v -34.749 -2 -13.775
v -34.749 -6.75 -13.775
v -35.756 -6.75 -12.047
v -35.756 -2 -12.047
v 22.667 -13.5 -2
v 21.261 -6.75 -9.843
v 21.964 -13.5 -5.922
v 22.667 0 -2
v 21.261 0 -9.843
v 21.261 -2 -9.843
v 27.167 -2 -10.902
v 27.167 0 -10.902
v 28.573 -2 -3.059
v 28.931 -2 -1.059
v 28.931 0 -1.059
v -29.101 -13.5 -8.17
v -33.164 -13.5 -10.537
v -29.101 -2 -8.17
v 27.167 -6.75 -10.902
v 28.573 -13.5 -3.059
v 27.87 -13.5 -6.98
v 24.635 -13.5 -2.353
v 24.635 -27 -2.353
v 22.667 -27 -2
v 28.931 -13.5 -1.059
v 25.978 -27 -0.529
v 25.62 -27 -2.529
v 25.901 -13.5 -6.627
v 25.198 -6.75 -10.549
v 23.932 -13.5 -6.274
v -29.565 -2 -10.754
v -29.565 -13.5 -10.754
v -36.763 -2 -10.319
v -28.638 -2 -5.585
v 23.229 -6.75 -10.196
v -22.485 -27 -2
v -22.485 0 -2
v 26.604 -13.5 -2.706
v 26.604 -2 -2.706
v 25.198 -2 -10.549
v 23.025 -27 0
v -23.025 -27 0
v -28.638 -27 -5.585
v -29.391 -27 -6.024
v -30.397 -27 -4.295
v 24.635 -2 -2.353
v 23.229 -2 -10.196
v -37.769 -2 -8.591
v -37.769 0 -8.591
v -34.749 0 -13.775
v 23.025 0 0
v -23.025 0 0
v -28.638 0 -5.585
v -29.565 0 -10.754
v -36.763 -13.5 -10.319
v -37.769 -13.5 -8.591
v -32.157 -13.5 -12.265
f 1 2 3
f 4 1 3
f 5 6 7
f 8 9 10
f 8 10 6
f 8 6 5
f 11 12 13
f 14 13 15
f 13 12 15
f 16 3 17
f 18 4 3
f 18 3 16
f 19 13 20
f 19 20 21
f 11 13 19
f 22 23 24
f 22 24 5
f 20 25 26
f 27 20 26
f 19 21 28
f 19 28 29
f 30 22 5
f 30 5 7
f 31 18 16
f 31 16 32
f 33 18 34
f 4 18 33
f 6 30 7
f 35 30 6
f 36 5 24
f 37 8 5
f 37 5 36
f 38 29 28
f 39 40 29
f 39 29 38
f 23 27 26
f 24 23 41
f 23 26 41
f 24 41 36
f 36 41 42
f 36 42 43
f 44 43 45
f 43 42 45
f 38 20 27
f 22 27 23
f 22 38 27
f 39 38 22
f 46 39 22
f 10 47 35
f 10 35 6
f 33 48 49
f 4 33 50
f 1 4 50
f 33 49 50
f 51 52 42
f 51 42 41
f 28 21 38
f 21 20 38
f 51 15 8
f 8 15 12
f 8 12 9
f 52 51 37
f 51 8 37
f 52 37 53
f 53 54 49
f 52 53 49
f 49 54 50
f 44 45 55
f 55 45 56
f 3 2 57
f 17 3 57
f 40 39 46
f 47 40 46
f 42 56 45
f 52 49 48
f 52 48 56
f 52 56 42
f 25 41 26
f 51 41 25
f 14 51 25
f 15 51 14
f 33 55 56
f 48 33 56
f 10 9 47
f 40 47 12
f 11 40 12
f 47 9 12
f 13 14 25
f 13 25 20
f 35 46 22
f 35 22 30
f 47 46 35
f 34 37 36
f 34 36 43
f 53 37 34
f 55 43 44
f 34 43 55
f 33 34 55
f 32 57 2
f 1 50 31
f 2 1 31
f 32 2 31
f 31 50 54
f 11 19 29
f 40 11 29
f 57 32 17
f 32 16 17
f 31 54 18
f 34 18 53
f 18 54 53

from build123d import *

# Parameters (mm, degrees)
BOSS_EXTRUDE1_DEPTH = 2
BOSS_EXTRUDE2_DEPTH = 25
BOSS_EXTRUDE3_DEPTH = 11.5
CUT_EXTRUDE2_DEPTH  = 2
CUT_EXTRUDE3_DEPTH  = 2.03188945
SKETCH8_W           = 7.96811055
SKETCH8_H           = 13.5
CUT_EXTRUDE4_DEPTH  = 2
CUT_EXTRUDE5_REACH  = 73.825
CUT_EXTRUDE6_DEPTH  = 2


with BuildPart() as part:
    # Sketch2 → Boss-Extrude1 (new body)
    with BuildSketch(Plane(origin=(0, 0, 0), x_dir=(1, 0, 0), z_dir=(0, 1, 0))):
        Polygon((-22.485232694, 2), (22.666829492, 2), (21.260674764, 9.843055182), (27.166507873, 10.901891943), (28.931235809, 1.058836761), (23.0254027, 0), (-23.0254027, 0), (-37.76942689, 8.590954614), (-34.748752683, 13.775115813), (-29.564591484, 10.754441606), (-28.637765281, 5.584918712), align=None)
    extrude(amount=-BOSS_EXTRUDE1_DEPTH)

    # Sketch3 → Boss-Extrude2 (add)
    with BuildSketch(Plane.XZ.offset(2)):
        Polygon((-37.76942689, -8.590954614), (-23.0254027, 0), (23.0254027, 0), (28.931235809, -1.058836761), (28.572662601, -3.058836759), (24.635440529, -2.352945585), (23.229285801, -10.196000769), (21.260674764, -9.843055182), (22.666829492, -2), (-22.485232694, -2), (-28.637765281, -5.584918712), (-36.762535488, -10.319008347), align=None)
    extrude(amount=BOSS_EXTRUDE2_DEPTH)

    # Sketch4 → Boss-Extrude3 (add)
    with BuildSketch(Plane.XZ.offset(2)):
        Polygon((25.197896837, -10.548946356), (26.604051565, -2.705891172), (28.572662601, -3.058836759), (27.166507873, -10.901891943), align=None)
        Polygon((-34.748752683, -13.775115813), (-35.755644085, -12.04706208), (-29.101178382, -8.169680159), (-29.564591484, -10.754441606), align=None)
    extrude(amount=BOSS_EXTRUDE3_DEPTH)

    # Sketch5 → Cut-Extrude2 (cut)
    with BuildSketch(Plane(origin=(-5.835962708, 0, 10.015834002), x_dir=(0.8640268665049071, 0, 0.5034457011016299), z_dir=(-0.5034457011016299, 0, 0.8640268665049071))):
        Polygon((-28.426722639, -27), (-36.958878734, -13.5), (-36.958878734, -27), align=None)
    extrude(amount=-CUT_EXTRUDE2_DEPTH, mode=Mode.SUBTRACT)

    # Sketch6 → Cut-Extrude3 (cut)
    with BuildSketch(Plane(origin=(0.717071985, 0, 3.999584852), x_dir=(0.9843055181910936, 0, -0.1764727935364628), z_dir=(0.1764727935364628, 0, 0.9843055181910936))):
        Polygon((25.664030936, -27), (28.664030936, -27), (28.664030936, -13.5), align=None)
    extrude(amount=-CUT_EXTRUDE3_DEPTH, mode=Mode.SUBTRACT)

    # Sketch8 → Cut-Extrude4 (cut)
    with BuildSketch(Plane(origin=(24.276941751, 0, -4.352530439), x_dir=(-0.17647279353646367, 0, -0.9843055181910934), z_dir=(0.9843055181910934, 0, -0.17647279353646367))):
        with Locations((1.952587588, -20.25)):
            Rectangle(SKETCH8_W, SKETCH8_H)
    extrude(amount=-CUT_EXTRUDE4_DEPTH, mode=Mode.SUBTRACT)

    # Cut-Extrude5: up to this face of the body (flat: up to its plane)
    cut_extrude5_end = Plane(part.part.faces().sort_by_distance((21.963752128, -6.75, -5.921527591))[0])
    # Sketch9 → Cut-Extrude5 (cut, up to the picked face)
    with BuildSketch(Plane(origin=(28.214163824, 0, -5.058421613), x_dir=(-0.17647279353646197, 0, -0.9843055181910936), z_dir=(0.9843055181910936, 0, -0.17647279353646197)), mode=Mode.PRIVATE) as cut_extrude5_sk1:
        Polygon((1.952587588, -13.5), (5.936642863, -6.75), (5.936642863, -13.5), align=None)
    cut_extrude5_tool1 = split(extrude(cut_extrude5_sk1.sketch, amount=-CUT_EXTRUDE5_REACH, mode=Mode.PRIVATE), bisect_by=cut_extrude5_end, keep=Keep.BOTH, mode=Mode.PRIVATE)
    add(cut_extrude5_tool1.solids().sort_by(Axis((27.400867, -11.25, -9.594716), (-0.9843055181910936, 0, 0.17647279353646197)))[0], mode=Mode.SUBTRACT)

    # Sketch10 → Cut-Extrude6 (cut)
    with BuildSketch(Plane(origin=(-2.815288501, 0, 4.831672803), x_dir=(-0.8640268665049072, 0, -0.5034457011016296), z_dir=(0.5034457011016296, 0, -0.8640268665049072))):
        Polygon((36.958878734, -6.75), (33.958878734, -13.5), (36.958878734, -13.5), align=None)
    extrude(amount=-CUT_EXTRUDE6_DEPTH, mode=Mode.SUBTRACT)


solid = part.part
